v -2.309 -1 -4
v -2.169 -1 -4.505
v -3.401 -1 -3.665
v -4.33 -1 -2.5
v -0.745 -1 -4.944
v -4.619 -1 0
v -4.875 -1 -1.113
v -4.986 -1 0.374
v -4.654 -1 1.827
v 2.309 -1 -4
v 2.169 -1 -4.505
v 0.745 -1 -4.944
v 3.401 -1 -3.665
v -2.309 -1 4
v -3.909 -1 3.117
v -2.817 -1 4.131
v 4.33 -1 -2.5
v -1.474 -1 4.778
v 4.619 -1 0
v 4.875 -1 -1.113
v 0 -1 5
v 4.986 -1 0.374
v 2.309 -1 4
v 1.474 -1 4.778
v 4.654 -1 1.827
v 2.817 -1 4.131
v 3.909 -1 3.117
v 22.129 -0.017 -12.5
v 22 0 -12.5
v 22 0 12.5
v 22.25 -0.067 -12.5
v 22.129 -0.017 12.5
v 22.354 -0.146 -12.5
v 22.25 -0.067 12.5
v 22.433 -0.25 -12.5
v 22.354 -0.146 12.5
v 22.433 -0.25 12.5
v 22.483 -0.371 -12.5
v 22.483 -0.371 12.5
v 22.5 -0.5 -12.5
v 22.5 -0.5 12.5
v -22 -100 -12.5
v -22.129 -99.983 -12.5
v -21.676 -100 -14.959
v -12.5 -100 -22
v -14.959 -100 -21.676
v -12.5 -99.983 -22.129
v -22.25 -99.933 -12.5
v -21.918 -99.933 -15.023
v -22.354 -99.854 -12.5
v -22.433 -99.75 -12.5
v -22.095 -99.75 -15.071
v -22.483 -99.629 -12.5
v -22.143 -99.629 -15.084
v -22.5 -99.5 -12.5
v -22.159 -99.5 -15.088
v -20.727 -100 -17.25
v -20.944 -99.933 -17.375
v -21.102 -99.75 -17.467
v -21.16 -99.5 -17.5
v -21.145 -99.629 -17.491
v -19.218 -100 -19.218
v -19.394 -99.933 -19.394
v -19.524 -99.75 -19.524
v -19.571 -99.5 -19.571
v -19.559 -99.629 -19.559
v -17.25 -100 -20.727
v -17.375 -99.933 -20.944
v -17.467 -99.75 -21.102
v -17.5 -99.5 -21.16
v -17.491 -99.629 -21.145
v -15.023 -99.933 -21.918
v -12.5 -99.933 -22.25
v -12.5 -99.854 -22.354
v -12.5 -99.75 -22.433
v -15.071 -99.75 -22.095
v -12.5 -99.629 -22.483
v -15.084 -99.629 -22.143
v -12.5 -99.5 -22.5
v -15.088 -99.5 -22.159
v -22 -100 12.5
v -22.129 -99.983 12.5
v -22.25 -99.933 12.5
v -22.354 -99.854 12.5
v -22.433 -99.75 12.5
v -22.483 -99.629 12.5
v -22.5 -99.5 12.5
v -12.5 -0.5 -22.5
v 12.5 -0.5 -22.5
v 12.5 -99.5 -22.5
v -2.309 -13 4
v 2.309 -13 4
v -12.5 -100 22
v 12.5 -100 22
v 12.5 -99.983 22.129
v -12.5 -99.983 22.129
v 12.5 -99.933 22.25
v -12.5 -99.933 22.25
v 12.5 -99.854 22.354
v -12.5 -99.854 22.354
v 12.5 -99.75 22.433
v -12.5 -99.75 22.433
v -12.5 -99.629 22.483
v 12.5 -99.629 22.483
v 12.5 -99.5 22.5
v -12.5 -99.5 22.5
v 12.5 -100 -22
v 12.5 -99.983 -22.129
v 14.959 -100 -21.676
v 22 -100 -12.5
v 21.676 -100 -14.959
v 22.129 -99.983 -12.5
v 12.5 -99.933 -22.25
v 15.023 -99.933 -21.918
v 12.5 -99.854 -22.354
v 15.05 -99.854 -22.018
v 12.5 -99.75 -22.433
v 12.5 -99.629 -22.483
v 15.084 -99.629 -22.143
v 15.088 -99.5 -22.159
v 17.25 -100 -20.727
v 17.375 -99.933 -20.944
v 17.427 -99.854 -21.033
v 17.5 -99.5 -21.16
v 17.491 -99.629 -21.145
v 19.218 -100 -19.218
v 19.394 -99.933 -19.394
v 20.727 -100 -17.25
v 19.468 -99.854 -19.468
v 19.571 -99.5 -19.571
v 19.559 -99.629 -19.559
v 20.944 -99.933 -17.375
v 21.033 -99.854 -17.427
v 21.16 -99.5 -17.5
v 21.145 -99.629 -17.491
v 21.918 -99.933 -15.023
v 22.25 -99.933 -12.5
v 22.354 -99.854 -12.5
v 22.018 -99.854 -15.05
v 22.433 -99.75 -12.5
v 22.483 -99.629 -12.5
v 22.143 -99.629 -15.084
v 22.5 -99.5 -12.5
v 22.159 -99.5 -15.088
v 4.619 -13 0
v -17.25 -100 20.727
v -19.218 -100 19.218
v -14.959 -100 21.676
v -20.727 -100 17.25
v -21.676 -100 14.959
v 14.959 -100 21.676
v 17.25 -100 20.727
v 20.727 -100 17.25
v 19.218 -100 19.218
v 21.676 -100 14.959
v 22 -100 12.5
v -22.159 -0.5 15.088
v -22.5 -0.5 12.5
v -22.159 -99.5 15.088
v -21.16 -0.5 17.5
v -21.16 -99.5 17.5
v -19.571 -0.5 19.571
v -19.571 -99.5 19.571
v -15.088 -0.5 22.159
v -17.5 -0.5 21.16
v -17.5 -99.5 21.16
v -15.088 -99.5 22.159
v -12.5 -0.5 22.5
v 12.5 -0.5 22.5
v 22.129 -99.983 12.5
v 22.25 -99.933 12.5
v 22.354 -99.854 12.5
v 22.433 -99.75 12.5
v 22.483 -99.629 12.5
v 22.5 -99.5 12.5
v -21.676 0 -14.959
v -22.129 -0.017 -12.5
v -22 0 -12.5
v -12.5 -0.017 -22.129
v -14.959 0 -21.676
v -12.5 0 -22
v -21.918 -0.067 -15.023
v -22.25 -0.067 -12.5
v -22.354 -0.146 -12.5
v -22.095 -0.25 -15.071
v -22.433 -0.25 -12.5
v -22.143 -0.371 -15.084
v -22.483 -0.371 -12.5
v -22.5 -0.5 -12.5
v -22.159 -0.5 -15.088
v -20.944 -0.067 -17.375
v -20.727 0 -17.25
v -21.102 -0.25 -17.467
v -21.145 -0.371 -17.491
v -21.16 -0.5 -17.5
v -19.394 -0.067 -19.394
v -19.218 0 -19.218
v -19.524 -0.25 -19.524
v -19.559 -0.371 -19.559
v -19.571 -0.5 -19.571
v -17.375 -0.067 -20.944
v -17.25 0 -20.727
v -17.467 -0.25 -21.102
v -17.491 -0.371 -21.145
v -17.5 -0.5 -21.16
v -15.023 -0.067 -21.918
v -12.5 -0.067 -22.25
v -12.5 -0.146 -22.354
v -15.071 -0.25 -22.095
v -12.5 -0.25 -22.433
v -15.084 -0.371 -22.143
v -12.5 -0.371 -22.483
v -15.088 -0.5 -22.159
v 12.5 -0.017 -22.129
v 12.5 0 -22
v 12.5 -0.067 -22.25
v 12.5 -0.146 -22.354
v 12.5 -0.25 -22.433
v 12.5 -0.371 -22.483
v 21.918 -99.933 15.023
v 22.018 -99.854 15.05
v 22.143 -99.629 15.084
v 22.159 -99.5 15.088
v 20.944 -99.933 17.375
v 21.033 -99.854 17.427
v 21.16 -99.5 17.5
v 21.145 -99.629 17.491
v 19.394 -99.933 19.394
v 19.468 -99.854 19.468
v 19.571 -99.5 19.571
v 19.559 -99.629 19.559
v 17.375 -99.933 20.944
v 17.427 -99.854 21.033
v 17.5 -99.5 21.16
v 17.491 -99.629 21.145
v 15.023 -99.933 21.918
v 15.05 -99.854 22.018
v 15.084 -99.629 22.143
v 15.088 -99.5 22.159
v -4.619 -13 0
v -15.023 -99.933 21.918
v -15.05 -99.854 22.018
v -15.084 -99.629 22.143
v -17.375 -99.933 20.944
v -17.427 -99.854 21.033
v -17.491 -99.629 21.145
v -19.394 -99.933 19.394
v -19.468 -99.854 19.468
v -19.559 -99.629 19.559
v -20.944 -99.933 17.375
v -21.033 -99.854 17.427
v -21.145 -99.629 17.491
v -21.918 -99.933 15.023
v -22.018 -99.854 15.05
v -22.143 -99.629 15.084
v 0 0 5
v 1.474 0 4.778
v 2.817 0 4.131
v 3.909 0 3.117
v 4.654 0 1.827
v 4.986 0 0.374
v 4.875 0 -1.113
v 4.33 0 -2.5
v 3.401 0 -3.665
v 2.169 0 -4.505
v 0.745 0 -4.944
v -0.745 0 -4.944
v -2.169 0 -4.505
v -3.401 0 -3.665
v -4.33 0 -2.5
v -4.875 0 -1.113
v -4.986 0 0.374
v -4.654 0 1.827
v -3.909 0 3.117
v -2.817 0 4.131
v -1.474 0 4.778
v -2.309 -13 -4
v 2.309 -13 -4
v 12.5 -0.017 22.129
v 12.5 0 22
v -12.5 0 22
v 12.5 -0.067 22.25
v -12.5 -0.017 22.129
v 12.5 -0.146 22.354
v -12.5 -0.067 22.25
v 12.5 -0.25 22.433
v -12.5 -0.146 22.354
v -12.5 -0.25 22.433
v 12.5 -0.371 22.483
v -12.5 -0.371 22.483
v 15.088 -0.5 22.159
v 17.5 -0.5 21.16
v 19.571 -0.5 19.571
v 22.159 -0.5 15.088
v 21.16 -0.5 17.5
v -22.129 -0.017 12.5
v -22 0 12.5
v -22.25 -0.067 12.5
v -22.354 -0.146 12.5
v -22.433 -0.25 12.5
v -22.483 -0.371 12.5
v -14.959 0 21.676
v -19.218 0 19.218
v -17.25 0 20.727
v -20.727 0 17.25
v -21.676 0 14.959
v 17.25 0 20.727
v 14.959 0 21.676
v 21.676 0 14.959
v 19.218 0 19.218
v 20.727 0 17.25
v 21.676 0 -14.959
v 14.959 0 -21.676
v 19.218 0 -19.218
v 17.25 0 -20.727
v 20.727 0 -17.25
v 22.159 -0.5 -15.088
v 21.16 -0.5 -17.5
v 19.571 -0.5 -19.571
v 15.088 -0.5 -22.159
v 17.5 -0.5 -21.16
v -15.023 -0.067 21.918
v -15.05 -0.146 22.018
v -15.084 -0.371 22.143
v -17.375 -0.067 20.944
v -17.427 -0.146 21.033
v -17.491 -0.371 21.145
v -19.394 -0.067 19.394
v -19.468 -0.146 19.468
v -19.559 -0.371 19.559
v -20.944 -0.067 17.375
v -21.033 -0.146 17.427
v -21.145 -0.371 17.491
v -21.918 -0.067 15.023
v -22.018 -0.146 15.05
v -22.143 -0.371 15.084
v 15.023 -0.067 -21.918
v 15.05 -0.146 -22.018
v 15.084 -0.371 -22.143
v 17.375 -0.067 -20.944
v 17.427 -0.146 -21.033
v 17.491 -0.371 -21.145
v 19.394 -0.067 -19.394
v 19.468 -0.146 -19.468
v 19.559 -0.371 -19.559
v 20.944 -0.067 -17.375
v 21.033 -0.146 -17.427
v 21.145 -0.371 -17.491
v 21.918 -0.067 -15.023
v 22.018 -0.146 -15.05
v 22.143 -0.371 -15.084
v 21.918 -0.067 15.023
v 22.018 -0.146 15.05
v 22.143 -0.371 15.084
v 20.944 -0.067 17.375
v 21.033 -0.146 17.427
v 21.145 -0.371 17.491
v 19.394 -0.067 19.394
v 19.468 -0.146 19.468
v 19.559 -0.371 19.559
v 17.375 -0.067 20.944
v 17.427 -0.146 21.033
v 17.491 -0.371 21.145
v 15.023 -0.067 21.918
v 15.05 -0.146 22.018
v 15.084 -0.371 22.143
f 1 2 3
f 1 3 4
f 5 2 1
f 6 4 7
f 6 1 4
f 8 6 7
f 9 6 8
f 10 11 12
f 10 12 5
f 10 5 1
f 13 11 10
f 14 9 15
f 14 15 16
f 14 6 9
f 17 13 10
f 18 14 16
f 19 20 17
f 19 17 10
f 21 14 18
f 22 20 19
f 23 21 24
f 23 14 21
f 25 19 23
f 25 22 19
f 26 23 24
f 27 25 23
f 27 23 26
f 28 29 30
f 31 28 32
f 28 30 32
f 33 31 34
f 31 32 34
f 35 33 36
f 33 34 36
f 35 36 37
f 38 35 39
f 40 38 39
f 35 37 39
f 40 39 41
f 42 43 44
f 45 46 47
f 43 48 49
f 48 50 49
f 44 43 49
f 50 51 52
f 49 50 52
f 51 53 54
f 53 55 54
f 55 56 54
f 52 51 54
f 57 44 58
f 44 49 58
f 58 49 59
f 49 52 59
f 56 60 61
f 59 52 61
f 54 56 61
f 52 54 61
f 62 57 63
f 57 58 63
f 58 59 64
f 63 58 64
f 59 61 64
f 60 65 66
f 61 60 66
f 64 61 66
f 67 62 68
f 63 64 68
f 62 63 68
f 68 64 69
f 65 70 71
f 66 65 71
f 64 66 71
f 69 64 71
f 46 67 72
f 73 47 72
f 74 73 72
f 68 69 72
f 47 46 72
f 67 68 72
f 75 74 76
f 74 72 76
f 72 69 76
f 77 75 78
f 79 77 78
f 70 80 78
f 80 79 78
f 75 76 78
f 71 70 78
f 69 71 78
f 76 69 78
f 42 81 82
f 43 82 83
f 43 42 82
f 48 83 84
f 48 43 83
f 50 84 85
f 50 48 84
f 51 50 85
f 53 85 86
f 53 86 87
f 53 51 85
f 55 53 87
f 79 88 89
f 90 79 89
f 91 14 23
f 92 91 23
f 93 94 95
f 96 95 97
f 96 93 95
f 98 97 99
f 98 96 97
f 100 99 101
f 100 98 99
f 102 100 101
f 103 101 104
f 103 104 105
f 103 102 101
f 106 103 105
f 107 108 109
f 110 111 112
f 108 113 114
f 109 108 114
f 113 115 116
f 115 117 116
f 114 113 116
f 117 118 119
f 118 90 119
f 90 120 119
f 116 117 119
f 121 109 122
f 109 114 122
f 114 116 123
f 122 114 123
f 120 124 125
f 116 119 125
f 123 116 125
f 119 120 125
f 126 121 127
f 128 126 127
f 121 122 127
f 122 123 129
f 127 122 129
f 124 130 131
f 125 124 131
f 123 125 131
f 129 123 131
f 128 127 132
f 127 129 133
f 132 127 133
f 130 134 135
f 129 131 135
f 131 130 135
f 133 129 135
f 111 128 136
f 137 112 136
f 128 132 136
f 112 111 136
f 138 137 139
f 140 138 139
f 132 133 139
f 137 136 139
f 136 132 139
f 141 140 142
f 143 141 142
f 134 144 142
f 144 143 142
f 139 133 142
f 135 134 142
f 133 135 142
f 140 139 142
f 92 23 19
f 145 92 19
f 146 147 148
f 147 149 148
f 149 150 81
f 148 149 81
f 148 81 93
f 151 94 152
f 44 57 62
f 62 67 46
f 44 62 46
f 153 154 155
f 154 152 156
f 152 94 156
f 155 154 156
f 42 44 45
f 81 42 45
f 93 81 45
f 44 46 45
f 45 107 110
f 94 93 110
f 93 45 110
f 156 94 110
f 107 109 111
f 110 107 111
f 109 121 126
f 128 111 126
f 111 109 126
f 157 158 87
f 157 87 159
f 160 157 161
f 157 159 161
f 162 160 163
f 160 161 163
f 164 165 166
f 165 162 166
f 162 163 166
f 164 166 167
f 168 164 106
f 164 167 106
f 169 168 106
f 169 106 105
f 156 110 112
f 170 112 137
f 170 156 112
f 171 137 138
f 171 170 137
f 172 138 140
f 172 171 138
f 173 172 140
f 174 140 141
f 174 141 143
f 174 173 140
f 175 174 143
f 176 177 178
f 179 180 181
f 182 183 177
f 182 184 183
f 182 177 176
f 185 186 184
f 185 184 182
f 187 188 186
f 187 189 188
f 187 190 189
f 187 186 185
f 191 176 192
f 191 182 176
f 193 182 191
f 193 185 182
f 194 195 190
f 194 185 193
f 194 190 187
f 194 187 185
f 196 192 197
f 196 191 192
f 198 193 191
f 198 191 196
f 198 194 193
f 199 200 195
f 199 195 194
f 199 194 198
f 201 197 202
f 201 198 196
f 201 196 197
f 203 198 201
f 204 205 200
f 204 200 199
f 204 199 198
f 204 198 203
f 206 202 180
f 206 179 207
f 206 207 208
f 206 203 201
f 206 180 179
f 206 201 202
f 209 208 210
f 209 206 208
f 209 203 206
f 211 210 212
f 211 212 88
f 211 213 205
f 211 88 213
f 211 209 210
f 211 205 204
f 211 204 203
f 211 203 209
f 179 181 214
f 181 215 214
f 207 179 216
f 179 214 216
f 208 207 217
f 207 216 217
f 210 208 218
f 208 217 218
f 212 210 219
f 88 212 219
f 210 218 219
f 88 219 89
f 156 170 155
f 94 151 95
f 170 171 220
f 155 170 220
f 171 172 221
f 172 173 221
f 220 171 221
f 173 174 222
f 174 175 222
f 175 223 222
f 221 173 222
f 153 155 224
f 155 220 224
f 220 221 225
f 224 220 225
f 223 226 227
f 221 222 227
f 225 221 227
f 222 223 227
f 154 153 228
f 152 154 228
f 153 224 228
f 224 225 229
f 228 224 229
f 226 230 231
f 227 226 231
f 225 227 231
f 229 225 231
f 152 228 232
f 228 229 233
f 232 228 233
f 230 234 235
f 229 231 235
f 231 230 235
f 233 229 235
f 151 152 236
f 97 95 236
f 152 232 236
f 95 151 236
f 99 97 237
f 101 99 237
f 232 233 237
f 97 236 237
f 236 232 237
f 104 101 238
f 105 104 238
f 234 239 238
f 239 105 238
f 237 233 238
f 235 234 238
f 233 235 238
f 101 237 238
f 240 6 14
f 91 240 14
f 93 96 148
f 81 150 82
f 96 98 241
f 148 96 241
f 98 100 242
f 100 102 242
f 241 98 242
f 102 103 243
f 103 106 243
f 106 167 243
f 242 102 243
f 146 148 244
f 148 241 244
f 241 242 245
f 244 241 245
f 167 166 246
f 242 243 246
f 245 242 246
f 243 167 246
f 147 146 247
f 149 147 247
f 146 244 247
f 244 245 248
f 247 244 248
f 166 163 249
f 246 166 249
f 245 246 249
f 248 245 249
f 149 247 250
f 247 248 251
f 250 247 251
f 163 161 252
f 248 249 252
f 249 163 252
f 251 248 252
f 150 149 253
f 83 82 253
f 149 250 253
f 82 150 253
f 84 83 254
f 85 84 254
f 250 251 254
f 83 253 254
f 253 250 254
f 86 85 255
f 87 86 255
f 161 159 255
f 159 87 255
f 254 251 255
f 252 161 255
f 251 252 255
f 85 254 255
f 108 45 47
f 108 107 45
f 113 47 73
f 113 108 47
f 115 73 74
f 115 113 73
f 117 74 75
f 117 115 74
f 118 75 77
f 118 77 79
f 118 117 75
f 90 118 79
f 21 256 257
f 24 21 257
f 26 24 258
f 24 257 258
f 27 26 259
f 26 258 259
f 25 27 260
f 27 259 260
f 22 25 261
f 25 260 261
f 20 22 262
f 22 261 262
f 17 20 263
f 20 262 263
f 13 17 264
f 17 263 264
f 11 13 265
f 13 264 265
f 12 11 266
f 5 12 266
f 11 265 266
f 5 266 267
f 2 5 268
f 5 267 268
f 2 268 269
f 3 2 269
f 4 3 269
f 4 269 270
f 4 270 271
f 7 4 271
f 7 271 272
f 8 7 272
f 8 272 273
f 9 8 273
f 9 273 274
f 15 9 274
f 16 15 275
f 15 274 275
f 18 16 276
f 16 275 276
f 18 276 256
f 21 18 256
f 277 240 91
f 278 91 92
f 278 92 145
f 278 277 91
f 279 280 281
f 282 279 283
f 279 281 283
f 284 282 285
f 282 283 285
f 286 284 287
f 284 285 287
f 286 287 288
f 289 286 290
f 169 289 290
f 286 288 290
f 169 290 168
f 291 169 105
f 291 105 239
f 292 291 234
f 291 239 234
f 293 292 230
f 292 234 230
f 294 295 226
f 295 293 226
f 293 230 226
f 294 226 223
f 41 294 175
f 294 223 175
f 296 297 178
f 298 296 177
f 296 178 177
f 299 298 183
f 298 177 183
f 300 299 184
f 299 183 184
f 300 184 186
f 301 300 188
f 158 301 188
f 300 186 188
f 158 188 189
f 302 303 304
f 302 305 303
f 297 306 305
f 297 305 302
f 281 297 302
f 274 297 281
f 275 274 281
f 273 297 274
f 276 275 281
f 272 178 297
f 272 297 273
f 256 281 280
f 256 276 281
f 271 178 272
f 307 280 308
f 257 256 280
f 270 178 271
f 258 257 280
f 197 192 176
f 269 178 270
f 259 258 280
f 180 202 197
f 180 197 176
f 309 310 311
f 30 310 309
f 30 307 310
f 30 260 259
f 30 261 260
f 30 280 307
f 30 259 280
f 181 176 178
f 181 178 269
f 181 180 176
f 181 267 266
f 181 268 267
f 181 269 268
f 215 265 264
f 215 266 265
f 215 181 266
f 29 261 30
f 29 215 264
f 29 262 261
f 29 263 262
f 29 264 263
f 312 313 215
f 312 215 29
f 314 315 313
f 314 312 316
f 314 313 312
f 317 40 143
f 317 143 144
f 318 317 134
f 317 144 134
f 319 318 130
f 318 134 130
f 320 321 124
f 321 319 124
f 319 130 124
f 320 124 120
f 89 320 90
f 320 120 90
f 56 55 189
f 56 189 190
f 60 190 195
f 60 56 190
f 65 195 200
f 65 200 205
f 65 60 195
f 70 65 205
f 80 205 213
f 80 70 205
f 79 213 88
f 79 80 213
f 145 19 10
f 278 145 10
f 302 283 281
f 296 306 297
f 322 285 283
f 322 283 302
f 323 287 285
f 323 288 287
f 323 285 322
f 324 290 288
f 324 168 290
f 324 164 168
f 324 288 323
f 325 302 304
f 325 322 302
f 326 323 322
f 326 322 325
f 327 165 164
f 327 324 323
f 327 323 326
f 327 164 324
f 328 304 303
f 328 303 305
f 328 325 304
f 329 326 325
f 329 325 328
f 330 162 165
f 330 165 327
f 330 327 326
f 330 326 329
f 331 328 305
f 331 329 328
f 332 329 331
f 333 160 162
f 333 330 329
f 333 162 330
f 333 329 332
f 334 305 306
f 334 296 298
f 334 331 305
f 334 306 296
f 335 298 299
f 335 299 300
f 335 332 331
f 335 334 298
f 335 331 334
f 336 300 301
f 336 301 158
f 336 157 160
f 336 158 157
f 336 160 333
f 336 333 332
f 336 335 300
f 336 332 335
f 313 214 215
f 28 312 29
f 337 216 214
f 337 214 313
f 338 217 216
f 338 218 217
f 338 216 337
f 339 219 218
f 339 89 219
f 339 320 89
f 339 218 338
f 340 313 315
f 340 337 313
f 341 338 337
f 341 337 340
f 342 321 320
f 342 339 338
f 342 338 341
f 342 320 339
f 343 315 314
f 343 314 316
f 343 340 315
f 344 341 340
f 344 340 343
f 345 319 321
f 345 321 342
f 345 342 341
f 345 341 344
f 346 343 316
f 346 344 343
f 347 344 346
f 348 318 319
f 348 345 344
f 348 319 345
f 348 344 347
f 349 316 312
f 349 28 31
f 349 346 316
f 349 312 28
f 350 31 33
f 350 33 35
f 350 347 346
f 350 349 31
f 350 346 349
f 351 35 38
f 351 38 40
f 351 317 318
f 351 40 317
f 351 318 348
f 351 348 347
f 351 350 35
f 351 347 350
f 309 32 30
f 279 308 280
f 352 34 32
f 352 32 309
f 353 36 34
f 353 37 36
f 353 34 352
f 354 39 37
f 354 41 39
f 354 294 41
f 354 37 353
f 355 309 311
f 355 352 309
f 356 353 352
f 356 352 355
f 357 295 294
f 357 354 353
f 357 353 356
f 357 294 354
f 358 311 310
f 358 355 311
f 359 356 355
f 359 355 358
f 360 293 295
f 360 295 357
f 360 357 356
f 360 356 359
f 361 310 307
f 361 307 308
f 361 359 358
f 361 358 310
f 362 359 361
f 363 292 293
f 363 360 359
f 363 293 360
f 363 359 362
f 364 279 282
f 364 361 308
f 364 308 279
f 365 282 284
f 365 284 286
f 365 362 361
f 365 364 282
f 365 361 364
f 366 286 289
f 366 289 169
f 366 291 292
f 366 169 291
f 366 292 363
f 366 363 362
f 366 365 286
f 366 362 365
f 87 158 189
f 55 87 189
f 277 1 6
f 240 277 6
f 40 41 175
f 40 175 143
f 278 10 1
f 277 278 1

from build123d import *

# Parameters (mm, degrees)
SKETCH_1_W          = 45
SKETCH_1_H          = 45
EXTRUDE_1_DEPTH     = 100
FILLET_1_R          = 10
FILLET_2_R          = 0.5
SKETCH_2_R          = 5
CUT_EXTRUDE_1_DEPTH = 1
CUT_EXTRUDE_2_DEPTH = 12


with BuildPart() as part:
    # 草图1 → 凸台-拉伸1 (new body)
    with BuildSketch(Plane(origin=(0, 0, 0), x_dir=(1, 0, 0), z_dir=(0, 1, 0))):
        Rectangle(SKETCH_1_W, SKETCH_1_H)
    extrude(amount=-EXTRUDE_1_DEPTH)

    # 圆角1
    fillet_1_edges = [part.edges().sort_by_distance(p)[0] for p in [
        (22.5, -50, 22.5),
        (-22.5, -50, 22.5),
        (-22.5, -50, -22.5),
        (22.5, -50, -22.5),
    ]]
    fillet(fillet_1_edges, radius=FILLET_1_R)

    # 圆角2
    fillet_2_edges = [part.edges().sort_by_distance(p)[0] for p in [
        (0, 0, -22.5),
        (0, -100, -22.5),
        (22.5, 0, 0),
        (-22.5, 0, 0),
        (0, 0, 22.5),
        (-19.571067812, 0, 19.571067812),
        (19.571067812, 0, 19.571067812),
        (19.571067812, 0, -19.571067812),
        (-19.571067812, 0, -19.571067812),
        (-22.5, -100, 0),
        (22.5, -100, 0),
        (0, -100, 22.5),
        (-19.571067812, -100, 19.571067812),
        (19.571067812, -100, 19.571067812),
        (19.571067812, -100, -19.571067812),
        (-19.571067812, -100, -19.571067812),
    ]]
    fillet(fillet_2_edges, radius=FILLET_2_R)

    # 草图2 → 切除-拉伸1 (cut)
    with BuildSketch(Plane(origin=(0, 0, 0), x_dir=(1, 0, 0), z_dir=(0, 1, 0))):
        with Locations(Location((0, 0, 0), (0, 0, 270))):
            Circle(SKETCH_2_R)
    extrude(amount=-CUT_EXTRUDE_1_DEPTH, mode=Mode.SUBTRACT)

    # 草图3 → 切除-拉伸2 (cut)
    with BuildSketch(Plane(origin=(0, -1, 0), x_dir=(1, 0, 0), z_dir=(0, 1, 0))):
        Polygon((4.618802154, 0), (2.309401077, 4), (-2.309401077, 4), (-4.618802154, 0), (-2.309401077, -4), (2.309401077, -4), align=None)
    extrude(amount=-CUT_EXTRUDE_2_DEPTH, mode=Mode.SUBTRACT)


solid = part.part
